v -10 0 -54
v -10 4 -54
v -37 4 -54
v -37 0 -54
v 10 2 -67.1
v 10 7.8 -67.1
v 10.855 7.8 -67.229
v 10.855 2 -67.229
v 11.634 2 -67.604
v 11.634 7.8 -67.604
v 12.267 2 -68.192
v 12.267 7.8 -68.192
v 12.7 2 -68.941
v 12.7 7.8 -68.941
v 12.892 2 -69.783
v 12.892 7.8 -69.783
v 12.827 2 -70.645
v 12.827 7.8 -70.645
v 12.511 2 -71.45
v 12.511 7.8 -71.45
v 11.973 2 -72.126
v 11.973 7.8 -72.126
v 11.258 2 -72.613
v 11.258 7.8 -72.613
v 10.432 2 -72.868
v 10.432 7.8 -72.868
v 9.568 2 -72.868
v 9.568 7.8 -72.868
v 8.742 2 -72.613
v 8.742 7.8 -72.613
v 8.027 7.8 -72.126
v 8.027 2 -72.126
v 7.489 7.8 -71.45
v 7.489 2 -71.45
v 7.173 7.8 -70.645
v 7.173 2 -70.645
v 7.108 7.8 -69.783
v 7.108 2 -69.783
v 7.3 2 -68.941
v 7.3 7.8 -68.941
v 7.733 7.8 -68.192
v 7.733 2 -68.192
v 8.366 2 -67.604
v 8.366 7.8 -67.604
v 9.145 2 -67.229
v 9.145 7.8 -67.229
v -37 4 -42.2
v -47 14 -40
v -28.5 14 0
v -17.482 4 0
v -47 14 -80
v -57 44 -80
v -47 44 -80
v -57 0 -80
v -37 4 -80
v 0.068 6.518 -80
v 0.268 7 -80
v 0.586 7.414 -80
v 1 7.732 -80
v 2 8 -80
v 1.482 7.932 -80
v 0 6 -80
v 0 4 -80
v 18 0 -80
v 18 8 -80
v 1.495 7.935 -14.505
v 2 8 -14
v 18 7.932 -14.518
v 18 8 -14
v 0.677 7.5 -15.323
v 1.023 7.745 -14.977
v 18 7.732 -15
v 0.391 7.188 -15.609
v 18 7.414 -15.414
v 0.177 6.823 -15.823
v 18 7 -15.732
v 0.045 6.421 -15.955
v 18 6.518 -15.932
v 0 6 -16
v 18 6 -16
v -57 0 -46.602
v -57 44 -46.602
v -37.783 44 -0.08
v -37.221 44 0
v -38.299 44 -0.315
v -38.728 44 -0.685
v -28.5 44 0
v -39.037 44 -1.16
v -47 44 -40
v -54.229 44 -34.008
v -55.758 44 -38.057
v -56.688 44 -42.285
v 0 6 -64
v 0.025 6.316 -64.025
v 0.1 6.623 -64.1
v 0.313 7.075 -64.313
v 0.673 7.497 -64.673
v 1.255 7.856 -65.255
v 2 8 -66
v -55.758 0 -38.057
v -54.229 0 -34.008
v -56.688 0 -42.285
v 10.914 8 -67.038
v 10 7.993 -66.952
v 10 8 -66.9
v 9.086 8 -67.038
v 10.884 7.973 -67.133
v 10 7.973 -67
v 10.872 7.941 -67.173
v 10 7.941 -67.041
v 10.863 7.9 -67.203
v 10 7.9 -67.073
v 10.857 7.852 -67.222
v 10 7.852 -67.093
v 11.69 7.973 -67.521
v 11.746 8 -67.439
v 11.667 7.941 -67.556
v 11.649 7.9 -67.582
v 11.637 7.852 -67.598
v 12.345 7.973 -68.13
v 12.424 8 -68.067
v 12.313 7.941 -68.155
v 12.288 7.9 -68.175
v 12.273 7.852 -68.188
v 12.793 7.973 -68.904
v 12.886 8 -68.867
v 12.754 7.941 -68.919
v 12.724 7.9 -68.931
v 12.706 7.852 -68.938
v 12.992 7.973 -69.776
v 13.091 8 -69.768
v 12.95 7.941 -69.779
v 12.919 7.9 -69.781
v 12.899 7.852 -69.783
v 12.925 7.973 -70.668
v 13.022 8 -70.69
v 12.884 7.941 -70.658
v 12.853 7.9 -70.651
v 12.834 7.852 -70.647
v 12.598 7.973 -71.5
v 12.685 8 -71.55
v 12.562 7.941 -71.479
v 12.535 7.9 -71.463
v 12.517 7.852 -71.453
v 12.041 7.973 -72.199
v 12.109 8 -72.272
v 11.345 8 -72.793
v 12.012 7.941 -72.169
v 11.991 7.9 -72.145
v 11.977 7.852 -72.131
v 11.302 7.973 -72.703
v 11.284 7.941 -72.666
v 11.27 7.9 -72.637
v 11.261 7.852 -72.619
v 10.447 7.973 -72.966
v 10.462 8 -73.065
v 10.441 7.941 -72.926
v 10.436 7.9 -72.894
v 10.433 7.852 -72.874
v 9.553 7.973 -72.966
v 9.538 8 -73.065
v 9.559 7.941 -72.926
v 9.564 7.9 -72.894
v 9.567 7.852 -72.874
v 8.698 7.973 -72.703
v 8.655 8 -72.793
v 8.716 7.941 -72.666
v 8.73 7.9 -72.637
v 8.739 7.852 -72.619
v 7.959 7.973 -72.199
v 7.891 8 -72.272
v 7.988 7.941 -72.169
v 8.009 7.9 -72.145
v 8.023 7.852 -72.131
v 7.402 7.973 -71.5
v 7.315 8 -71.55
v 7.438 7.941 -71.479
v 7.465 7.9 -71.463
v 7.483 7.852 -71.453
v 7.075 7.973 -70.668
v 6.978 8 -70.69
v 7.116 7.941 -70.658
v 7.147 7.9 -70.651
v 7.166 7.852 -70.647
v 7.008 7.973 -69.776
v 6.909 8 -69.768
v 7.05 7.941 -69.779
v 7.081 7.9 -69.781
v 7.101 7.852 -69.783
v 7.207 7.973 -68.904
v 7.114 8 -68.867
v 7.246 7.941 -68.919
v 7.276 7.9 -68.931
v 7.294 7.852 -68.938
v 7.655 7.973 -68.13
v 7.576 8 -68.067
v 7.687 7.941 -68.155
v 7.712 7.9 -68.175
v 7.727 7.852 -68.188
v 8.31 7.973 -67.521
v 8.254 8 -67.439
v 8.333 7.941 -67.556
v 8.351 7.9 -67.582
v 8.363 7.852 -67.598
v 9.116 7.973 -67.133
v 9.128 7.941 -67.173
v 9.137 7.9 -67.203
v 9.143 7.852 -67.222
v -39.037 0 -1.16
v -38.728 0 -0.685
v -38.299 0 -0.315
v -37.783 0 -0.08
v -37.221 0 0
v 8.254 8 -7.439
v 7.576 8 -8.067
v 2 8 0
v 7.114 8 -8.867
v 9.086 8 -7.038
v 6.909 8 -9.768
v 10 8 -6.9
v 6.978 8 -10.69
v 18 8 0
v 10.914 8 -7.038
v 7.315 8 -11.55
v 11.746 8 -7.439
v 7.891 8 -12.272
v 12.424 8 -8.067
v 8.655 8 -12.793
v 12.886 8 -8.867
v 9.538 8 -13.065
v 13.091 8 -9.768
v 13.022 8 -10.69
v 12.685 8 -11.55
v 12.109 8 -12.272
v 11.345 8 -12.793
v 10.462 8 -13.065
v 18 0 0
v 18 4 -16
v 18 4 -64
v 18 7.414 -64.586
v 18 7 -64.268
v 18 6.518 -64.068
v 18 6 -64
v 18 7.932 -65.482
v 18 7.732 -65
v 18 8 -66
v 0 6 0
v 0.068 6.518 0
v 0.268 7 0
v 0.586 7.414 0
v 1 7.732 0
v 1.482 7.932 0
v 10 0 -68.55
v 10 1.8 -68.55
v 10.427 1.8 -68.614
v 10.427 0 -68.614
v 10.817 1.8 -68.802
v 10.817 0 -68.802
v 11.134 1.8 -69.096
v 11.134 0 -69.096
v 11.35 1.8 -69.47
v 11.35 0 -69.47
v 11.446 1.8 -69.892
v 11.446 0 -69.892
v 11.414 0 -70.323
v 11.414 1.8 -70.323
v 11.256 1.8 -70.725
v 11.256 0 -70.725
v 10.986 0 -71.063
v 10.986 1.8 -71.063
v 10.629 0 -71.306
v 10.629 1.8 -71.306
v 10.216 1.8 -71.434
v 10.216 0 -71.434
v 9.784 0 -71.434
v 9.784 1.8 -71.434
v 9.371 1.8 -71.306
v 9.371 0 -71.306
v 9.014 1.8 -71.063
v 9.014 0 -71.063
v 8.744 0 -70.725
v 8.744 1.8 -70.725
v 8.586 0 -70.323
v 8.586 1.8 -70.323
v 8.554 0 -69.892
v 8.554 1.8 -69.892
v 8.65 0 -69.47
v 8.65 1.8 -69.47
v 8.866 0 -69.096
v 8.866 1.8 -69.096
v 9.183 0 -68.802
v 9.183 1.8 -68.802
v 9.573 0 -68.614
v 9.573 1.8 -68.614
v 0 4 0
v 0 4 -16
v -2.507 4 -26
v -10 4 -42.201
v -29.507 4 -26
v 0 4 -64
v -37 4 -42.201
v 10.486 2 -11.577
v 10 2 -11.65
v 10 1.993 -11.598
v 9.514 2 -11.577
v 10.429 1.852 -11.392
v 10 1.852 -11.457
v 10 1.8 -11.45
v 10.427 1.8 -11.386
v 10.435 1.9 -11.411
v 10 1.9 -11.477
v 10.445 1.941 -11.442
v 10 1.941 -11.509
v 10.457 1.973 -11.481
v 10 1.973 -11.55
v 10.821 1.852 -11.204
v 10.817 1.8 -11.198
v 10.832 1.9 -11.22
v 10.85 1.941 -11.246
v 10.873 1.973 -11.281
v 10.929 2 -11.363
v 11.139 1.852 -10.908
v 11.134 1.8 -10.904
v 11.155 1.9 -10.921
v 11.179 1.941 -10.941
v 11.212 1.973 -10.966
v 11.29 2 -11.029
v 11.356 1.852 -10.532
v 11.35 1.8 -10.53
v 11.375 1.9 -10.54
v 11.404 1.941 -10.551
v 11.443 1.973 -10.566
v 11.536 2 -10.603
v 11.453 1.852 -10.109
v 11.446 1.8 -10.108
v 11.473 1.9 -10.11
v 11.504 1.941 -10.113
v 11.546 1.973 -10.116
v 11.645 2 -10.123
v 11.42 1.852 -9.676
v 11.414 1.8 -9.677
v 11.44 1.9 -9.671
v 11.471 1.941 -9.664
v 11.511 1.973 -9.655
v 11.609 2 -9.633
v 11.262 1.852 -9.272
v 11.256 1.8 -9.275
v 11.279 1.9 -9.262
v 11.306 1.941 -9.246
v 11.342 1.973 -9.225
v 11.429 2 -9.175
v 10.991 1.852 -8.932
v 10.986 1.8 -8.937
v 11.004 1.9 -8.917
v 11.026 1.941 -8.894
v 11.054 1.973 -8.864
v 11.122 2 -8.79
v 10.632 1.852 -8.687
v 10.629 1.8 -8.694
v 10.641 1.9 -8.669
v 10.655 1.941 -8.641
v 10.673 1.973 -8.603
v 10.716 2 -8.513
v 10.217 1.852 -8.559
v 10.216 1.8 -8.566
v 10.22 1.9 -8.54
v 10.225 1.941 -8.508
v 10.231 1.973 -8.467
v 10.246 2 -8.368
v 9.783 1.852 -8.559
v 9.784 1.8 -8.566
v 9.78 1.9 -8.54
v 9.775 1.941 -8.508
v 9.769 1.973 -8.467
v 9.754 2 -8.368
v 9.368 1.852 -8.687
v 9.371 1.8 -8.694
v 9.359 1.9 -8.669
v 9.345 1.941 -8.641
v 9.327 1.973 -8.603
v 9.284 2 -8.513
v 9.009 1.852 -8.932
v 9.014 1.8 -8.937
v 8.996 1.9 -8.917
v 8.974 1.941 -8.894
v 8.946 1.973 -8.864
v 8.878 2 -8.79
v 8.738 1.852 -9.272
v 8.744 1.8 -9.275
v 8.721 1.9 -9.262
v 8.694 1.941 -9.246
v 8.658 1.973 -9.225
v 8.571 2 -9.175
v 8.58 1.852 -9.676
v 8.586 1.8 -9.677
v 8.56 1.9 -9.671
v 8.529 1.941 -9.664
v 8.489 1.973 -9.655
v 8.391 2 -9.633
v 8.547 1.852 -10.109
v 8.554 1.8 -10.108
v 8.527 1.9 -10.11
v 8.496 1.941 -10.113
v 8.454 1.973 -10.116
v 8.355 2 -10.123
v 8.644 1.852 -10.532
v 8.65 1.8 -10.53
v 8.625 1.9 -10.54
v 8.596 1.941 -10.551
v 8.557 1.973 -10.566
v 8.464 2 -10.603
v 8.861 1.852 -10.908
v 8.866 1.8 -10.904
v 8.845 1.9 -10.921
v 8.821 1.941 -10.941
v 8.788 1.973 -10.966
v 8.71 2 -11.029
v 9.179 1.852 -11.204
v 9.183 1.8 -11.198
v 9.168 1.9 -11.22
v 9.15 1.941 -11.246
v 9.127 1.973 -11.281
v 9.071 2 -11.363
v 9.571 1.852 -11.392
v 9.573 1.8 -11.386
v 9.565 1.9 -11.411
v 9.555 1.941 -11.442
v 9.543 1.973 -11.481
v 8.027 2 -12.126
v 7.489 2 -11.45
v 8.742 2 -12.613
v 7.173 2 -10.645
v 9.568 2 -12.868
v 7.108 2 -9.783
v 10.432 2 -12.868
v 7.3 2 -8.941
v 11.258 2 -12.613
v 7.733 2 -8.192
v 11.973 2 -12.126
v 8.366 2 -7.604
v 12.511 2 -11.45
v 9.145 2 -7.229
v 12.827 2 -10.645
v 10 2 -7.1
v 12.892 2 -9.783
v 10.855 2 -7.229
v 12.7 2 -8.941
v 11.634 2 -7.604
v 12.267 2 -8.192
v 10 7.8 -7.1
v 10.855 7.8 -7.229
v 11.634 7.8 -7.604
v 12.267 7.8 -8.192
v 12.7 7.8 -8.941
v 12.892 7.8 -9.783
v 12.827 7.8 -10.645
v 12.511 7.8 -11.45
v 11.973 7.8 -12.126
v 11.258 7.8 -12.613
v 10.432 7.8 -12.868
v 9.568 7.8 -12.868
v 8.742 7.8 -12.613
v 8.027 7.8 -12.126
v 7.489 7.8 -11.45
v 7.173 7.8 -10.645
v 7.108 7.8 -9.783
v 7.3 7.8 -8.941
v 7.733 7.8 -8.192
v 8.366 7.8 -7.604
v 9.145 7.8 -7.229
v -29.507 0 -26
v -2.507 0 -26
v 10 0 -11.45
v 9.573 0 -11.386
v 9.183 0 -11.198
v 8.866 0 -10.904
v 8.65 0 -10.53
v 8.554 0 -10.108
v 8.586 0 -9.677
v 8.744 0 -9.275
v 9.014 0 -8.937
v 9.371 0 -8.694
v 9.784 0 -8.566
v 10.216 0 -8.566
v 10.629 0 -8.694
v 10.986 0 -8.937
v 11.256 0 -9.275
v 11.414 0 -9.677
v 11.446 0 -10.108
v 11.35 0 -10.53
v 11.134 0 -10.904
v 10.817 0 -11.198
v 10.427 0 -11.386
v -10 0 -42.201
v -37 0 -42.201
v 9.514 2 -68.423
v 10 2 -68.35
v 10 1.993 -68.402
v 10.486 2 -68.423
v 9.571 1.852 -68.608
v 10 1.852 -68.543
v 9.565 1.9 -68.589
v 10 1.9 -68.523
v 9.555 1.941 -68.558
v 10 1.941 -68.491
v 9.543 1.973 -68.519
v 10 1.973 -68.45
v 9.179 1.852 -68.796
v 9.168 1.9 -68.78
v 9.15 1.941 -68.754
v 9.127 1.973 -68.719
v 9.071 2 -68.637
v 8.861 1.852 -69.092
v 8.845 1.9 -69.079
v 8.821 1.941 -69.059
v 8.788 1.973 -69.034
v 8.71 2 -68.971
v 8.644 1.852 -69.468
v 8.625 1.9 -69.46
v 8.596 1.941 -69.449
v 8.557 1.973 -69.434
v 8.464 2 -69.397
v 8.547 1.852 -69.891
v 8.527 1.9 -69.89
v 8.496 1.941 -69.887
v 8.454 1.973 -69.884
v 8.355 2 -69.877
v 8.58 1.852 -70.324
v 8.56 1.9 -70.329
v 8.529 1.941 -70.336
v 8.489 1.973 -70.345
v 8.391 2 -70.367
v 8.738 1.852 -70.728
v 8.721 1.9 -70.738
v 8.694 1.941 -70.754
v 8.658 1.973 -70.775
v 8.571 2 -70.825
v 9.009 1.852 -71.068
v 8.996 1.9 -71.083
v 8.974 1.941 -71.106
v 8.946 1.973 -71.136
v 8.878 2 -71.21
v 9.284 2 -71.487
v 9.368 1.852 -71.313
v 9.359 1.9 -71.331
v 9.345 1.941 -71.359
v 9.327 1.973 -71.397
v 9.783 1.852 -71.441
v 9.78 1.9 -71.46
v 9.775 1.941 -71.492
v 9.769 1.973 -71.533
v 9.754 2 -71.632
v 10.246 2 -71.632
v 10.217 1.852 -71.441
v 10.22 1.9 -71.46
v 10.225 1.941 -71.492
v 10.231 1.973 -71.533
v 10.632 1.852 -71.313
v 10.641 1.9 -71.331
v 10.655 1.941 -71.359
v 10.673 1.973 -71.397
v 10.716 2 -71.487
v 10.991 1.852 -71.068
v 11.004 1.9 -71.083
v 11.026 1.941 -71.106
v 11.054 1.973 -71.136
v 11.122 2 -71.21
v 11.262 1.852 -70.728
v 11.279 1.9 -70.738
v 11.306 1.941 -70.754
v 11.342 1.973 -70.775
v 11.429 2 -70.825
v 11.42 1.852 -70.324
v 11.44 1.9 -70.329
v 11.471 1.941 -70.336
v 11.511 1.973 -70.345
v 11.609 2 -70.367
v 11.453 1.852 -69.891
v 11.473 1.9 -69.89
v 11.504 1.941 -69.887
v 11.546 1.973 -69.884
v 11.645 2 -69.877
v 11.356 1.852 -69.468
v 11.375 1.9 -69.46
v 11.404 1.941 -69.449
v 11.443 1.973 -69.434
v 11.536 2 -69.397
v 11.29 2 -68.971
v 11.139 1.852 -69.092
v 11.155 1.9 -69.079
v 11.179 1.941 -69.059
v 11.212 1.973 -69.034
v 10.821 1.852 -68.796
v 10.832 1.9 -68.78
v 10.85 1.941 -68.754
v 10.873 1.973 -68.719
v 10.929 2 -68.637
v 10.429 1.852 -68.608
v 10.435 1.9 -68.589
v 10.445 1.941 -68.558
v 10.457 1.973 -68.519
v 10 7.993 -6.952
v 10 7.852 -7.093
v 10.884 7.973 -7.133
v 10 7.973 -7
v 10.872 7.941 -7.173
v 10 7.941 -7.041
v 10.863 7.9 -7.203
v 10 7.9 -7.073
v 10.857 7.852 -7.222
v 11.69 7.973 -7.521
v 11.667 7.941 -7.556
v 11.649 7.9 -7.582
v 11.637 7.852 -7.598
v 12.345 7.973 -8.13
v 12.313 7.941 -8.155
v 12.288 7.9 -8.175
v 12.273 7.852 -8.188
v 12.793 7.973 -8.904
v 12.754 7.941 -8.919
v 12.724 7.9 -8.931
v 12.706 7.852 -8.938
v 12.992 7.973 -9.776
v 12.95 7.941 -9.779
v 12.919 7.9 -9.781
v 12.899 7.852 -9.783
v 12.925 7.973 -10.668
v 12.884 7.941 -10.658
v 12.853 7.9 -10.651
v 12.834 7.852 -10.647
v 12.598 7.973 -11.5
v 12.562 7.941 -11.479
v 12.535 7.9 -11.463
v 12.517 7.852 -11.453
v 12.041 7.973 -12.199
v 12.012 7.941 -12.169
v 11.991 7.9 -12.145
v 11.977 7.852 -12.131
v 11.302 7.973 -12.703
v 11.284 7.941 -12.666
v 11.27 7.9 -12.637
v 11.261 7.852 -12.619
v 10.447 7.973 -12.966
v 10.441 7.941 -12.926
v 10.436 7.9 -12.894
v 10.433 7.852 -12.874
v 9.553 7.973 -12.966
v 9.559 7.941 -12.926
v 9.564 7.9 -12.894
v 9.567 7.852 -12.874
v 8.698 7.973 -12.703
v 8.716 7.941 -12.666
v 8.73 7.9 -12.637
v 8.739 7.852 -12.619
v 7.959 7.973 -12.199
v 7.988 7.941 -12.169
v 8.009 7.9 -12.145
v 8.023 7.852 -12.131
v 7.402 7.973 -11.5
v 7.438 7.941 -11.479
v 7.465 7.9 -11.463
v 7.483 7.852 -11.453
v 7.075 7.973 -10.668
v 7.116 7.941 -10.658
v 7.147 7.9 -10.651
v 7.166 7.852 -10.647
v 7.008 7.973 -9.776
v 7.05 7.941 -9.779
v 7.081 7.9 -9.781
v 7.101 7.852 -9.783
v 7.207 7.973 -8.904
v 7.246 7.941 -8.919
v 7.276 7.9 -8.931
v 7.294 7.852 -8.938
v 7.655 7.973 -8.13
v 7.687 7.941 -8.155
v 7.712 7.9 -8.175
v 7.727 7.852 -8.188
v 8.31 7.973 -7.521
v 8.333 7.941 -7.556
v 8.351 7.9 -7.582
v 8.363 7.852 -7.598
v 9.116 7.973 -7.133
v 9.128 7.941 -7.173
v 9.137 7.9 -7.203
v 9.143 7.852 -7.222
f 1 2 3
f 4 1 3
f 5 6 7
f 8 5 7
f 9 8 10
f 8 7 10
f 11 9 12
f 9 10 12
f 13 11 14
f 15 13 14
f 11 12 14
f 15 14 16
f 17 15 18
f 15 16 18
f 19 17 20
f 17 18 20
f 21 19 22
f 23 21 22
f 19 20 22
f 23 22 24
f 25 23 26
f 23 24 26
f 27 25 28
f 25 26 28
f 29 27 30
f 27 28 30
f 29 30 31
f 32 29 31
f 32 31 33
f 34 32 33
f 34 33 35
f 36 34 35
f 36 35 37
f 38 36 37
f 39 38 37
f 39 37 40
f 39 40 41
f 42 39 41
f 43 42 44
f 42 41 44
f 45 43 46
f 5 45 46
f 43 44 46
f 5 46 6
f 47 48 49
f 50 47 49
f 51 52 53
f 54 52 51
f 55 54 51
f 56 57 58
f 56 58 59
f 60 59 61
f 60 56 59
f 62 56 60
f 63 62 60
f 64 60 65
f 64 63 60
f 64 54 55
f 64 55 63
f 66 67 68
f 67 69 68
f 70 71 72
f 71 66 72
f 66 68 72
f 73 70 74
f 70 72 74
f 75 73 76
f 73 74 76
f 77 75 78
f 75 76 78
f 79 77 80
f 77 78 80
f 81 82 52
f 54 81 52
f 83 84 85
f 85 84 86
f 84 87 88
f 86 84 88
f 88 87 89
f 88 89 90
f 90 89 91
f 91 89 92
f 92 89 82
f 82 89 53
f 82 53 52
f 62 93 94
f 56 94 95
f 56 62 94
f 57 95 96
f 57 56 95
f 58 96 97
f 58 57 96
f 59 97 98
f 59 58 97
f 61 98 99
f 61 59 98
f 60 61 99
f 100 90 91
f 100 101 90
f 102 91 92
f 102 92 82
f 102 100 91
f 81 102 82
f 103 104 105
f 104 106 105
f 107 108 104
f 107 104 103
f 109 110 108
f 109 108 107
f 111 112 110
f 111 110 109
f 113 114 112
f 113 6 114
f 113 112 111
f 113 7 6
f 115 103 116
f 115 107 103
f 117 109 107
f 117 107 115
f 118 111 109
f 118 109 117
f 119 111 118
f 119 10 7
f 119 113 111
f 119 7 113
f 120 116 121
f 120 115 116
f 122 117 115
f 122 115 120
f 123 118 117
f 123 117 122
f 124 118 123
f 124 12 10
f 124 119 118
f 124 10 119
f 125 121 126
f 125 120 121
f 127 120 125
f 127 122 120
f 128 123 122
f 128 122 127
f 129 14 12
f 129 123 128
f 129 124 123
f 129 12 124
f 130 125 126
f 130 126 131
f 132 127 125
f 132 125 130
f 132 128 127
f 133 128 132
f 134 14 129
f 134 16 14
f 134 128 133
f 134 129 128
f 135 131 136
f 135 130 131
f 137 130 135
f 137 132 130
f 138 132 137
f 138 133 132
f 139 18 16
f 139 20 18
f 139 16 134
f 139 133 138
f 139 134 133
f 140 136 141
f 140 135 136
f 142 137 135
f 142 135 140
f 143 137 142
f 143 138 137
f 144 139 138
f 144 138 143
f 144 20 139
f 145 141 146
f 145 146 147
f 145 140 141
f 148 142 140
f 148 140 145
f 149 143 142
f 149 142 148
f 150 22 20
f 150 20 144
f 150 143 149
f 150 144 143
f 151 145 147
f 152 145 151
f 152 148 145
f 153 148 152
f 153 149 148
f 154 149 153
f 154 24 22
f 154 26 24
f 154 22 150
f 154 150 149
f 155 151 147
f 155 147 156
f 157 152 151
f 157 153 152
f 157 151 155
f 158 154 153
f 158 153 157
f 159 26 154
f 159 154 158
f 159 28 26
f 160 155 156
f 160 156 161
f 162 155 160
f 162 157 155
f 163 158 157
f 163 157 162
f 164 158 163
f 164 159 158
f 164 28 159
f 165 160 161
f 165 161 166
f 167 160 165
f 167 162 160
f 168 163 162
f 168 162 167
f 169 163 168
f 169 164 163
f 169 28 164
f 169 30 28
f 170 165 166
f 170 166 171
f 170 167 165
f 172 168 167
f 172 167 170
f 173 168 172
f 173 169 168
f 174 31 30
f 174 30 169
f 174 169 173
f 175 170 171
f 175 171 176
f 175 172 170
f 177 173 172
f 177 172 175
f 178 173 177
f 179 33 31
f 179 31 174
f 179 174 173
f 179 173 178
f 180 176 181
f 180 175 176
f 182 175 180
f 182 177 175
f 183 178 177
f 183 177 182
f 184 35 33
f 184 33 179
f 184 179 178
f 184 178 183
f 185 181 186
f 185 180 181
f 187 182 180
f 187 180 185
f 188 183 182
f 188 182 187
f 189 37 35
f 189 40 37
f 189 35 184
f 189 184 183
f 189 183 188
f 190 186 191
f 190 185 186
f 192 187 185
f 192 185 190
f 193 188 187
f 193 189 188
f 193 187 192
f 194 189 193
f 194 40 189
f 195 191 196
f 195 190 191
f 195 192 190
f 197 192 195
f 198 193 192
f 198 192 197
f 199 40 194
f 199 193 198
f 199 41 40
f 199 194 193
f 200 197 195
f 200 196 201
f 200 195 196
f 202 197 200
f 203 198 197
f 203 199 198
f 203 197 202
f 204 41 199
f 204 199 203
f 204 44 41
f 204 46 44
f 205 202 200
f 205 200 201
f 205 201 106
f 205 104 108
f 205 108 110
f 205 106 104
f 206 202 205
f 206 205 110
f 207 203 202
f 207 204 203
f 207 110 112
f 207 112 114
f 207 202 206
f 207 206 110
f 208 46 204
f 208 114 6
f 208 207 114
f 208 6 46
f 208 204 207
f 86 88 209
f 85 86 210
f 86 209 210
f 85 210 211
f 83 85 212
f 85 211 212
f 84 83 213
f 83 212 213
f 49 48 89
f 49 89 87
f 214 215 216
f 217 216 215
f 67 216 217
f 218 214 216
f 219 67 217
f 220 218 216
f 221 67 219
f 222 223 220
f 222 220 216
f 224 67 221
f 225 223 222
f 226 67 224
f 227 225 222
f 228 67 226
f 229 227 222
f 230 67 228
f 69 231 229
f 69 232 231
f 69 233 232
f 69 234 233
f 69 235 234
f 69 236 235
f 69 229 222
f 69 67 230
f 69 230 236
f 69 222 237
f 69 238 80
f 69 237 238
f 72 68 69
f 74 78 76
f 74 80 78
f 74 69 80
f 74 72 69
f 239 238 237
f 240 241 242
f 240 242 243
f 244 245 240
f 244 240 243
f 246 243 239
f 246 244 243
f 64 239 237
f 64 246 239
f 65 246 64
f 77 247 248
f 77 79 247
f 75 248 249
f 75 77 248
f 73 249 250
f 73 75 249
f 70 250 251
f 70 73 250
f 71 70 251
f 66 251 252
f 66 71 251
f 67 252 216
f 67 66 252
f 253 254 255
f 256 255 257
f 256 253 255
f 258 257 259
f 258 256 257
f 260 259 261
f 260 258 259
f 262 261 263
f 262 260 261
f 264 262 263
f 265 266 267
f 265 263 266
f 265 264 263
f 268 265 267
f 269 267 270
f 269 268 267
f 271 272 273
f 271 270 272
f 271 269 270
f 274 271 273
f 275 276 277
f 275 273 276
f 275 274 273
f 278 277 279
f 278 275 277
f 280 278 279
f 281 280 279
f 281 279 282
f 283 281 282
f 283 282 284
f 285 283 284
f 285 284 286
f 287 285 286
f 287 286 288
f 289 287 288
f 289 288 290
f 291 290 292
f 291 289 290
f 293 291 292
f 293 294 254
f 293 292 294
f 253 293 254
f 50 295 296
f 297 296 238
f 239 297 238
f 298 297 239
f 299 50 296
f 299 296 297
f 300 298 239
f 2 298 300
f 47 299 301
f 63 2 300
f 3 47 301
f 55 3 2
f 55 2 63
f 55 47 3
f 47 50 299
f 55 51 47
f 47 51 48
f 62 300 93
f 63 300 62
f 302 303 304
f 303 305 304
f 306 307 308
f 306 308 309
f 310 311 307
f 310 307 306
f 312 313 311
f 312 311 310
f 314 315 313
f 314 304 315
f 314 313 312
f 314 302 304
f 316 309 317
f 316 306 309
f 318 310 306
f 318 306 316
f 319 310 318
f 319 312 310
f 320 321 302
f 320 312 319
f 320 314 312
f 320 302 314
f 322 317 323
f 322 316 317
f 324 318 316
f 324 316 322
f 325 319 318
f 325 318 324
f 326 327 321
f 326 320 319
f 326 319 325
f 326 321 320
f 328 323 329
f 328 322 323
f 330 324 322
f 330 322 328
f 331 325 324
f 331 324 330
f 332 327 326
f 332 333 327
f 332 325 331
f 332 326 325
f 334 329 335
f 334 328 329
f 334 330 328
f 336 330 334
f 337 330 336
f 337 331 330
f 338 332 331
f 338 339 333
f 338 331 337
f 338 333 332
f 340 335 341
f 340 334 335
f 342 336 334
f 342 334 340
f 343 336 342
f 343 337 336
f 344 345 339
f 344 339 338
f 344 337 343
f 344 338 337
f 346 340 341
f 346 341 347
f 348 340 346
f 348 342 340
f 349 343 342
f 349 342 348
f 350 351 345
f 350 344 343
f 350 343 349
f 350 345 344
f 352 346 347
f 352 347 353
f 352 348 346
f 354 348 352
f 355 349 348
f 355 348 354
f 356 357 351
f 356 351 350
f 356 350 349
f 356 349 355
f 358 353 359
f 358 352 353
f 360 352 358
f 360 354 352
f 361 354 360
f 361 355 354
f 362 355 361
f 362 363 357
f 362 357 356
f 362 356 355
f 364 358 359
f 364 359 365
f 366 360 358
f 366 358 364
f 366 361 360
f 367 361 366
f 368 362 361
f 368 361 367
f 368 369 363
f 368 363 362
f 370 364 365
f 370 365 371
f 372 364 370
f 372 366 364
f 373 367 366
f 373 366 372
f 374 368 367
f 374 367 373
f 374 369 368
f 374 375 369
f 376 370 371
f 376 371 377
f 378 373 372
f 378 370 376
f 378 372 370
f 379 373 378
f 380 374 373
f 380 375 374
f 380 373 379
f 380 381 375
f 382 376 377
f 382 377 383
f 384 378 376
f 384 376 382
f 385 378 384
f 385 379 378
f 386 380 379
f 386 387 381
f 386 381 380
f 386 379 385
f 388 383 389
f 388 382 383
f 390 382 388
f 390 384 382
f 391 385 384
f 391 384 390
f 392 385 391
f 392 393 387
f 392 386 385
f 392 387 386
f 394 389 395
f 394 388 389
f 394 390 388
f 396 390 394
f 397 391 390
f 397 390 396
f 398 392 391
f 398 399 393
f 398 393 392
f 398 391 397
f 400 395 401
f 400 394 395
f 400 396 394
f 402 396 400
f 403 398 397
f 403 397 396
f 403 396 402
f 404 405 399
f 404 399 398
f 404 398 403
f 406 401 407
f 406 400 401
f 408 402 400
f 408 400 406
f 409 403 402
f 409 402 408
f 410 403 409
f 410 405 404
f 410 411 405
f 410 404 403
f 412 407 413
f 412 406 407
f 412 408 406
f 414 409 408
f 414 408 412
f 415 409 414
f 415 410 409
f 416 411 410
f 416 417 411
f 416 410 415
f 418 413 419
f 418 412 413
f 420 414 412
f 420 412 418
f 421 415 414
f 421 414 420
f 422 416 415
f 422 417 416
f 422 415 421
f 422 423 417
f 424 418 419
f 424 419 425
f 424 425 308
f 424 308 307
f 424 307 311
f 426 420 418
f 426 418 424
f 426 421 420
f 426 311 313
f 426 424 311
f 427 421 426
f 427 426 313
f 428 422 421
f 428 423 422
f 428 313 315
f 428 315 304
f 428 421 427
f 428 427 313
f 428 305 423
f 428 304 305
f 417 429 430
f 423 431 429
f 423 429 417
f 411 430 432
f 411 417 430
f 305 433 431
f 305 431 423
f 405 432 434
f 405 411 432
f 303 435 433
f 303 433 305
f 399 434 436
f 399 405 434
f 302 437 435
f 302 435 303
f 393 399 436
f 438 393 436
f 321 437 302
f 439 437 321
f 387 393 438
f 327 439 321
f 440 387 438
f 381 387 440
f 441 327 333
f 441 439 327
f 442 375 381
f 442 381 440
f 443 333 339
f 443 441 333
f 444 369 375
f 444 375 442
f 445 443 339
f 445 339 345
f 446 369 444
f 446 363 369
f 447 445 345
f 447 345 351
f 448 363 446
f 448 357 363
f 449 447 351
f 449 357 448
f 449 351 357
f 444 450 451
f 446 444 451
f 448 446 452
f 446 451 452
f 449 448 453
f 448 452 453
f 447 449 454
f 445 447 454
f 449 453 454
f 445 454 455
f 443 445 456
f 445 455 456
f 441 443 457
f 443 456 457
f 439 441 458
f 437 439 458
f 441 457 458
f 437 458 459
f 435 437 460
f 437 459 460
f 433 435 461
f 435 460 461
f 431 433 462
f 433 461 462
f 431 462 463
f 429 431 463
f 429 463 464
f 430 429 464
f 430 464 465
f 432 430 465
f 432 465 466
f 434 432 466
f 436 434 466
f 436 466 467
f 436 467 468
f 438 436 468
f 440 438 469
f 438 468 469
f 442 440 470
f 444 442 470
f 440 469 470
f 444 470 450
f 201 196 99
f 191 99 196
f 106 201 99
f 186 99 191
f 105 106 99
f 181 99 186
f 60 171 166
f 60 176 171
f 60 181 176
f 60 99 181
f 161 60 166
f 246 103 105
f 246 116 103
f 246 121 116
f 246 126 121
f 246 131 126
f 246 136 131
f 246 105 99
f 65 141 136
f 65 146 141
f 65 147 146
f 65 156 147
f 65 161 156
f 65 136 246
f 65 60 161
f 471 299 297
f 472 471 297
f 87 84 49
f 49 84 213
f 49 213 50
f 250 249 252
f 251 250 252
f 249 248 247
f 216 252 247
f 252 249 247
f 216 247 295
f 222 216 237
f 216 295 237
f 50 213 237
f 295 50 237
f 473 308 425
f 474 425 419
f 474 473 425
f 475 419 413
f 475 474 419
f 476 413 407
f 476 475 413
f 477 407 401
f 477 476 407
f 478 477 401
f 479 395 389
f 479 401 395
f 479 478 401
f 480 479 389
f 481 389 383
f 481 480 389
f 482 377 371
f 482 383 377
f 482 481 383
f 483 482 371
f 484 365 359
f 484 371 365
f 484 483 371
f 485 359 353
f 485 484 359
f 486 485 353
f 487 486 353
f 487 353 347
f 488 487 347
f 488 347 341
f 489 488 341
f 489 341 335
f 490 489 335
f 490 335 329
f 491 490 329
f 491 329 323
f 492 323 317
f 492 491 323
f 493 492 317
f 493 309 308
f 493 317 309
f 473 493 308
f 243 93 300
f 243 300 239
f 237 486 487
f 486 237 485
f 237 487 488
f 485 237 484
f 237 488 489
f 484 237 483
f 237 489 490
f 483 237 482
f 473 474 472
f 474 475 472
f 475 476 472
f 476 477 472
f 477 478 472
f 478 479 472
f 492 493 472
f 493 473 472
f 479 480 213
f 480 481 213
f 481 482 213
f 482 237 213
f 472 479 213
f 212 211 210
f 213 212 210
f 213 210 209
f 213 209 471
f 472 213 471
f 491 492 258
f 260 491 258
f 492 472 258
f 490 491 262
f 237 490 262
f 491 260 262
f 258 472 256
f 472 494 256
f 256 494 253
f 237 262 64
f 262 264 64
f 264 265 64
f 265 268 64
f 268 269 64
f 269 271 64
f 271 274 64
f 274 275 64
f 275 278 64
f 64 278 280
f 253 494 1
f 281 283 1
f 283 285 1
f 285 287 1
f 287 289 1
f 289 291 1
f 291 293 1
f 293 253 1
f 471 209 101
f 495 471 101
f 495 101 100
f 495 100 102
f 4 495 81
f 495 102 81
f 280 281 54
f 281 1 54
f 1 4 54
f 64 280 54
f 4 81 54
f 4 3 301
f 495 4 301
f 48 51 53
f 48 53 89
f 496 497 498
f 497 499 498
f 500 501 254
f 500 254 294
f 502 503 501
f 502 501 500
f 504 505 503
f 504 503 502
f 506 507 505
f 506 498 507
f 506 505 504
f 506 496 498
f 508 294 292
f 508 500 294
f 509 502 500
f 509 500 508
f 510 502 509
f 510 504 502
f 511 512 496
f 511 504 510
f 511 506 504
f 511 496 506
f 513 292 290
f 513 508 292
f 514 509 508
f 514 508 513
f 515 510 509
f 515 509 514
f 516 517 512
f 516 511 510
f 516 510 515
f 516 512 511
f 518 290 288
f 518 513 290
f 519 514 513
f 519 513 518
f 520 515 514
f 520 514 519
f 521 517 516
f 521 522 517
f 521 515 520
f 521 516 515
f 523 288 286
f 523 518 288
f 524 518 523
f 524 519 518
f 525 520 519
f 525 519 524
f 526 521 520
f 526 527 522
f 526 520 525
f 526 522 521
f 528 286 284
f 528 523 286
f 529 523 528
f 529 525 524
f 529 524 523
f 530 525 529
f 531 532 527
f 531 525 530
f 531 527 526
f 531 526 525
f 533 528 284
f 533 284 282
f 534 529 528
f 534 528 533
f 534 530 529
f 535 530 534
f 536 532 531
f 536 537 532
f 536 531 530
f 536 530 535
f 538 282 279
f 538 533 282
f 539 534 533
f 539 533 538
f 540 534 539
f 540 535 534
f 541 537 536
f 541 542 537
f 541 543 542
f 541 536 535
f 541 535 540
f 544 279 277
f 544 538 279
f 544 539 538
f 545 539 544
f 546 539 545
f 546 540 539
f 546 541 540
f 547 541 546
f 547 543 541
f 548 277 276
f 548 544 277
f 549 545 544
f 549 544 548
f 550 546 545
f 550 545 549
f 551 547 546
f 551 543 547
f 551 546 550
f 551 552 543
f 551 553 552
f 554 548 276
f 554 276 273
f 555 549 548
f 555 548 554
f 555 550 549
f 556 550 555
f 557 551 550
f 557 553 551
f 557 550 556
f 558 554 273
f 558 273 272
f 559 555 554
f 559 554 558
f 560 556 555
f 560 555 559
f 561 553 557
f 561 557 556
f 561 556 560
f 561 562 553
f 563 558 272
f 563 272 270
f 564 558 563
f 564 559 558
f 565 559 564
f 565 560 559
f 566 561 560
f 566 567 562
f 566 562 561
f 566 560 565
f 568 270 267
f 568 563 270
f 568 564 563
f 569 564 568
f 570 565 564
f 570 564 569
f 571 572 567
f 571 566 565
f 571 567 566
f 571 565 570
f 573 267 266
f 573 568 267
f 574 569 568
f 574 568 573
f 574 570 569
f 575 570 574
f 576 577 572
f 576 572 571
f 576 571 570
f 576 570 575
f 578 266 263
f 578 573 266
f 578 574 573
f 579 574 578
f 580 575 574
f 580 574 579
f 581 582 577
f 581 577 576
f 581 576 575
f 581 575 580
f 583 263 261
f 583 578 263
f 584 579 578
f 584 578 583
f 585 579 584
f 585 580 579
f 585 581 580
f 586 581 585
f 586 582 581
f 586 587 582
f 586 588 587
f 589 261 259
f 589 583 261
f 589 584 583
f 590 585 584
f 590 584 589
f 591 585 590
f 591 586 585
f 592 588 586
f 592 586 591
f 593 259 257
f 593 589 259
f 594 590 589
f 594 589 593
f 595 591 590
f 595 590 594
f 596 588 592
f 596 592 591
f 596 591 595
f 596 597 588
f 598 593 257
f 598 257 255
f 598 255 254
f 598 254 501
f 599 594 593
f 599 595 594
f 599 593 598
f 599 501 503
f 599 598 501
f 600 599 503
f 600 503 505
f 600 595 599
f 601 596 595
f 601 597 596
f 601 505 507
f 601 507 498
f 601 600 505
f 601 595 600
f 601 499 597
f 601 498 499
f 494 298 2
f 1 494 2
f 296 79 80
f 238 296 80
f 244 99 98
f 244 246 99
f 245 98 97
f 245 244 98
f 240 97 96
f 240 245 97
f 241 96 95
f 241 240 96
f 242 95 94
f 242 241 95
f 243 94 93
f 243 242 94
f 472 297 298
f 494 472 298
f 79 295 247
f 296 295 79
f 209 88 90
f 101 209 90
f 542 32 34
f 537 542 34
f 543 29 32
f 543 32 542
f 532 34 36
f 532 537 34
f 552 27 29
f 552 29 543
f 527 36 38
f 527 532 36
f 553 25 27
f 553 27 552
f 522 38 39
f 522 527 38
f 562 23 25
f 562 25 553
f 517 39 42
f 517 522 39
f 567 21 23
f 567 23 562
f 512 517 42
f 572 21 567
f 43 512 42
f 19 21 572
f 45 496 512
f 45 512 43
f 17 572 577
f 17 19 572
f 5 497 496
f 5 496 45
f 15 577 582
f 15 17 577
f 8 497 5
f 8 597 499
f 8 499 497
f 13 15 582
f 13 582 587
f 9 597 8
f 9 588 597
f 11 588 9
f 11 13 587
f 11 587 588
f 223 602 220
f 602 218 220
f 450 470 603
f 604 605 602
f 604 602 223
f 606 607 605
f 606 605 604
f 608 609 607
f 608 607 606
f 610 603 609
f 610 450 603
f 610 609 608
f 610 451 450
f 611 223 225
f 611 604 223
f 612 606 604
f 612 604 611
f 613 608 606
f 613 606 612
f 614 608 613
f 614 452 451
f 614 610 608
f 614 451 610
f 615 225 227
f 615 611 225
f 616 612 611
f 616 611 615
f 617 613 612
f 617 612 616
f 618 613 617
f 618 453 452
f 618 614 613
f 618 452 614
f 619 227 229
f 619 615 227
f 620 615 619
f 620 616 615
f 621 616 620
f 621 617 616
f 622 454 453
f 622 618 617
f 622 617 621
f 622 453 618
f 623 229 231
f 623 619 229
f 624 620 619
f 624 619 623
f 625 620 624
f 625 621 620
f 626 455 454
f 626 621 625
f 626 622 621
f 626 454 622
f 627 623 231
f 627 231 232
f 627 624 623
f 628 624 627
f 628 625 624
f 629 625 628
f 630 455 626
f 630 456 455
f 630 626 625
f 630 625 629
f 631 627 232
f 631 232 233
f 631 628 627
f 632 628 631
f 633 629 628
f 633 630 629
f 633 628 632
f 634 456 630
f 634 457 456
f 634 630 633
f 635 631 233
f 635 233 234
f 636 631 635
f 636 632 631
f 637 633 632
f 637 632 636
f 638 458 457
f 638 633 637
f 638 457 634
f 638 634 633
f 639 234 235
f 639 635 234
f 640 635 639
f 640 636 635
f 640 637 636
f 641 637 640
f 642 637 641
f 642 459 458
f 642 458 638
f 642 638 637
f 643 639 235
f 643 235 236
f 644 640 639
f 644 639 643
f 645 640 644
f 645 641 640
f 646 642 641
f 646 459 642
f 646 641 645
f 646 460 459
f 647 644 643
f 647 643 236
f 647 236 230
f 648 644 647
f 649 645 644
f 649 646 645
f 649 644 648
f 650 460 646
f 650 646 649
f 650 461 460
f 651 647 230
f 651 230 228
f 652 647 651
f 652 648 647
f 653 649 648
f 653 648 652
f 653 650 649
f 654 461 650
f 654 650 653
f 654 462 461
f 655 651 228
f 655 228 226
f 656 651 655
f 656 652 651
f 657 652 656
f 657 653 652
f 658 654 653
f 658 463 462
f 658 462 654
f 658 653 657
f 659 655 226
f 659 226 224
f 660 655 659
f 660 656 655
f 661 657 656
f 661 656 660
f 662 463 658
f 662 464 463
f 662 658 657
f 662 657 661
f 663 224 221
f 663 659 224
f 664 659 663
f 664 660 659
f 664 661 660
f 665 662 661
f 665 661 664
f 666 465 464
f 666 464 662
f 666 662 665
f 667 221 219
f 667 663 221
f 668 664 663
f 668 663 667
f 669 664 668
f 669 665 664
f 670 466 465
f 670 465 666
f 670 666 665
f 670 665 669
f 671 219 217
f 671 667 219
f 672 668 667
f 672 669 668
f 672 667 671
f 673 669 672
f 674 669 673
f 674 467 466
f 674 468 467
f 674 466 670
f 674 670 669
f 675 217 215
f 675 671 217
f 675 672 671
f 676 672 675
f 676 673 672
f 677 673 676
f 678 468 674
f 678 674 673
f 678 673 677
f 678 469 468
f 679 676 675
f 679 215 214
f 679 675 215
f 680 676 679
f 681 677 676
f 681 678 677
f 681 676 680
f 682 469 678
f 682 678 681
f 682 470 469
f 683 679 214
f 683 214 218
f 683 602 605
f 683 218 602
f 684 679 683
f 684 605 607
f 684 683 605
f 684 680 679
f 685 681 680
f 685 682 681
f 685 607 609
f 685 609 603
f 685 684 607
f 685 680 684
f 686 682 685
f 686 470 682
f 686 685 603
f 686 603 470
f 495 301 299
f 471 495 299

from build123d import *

# Parameters (mm, degrees)
SKETCH_1_W               = 57
SKETCH_1_H               = 80
EXTRUDE_1_DEPTH          = 4
EXTRUDE_2_DEPTH          = 40
CUT_EXTRUDE_1_DEPTH      = 16
SKETCH_4_W               = 80
SKETCH_4_H               = 4
EXTRUDE_3_DEPTH          = 20
SKETCH_7_W               = 20
SKETCH_7_H               = 80
EXTRUDE_4_DEPTH          = 4
CUT_EXTRUDE_2_DEPTH      = 4
CUT_EXTRUDE_2_DEPTH_BACK = 4
SKETCH_5_R               = 1.45
SKETCH_8_R               = 2.9
CUT_EXTRUDE_3_DEPTH      = 6
SKETCH_9_W               = 80
SKETCH_9_H               = 8
CUT_EXTRUDE_4_DEPTH      = 2
SKETCH_10_W              = 18
SKETCH_10_H              = 48
CUT_EXTRUDE_5_DEPTH      = 4
CUT_EXTRUDE_6_DEPTH      = 4
CHAMFER_1_SIZE           = 10
FILLET_1_R               = 30
FILLET_2_R               = 2
FILLET_3_R               = 0.2


with BuildPart() as part:
    # 草图1 → 凸台-拉伸1 (new body)
    with BuildSketch(Plane(origin=(0, 0, 0), x_dir=(1, 0, 0), z_dir=(0, 1, 0))):
        with Locations((-28.5, 40)):
            Rectangle(SKETCH_1_W, SKETCH_1_H)
    extrude(amount=EXTRUDE_1_DEPTH)

    # 草图2 → 凸台-拉伸2 (add)
    with BuildSketch(Plane(origin=(0, 4, 0), x_dir=(1, 0, 0), z_dir=(0, 1, 0))):
        Polygon((-47, 40), (-28.5, 0), (-38.5, 0), (-57, 40), (-57, 80), (-47, 80), align=None)
    extrude(amount=EXTRUDE_2_DEPTH)

    # 草图3 → 切除-拉伸1 (cut)
    with BuildSketch(Plane(origin=(0, 4, 0), x_dir=(1, 0, 0), z_dir=(0, 1, 0))):
        Polygon((-38.5, 0), (-57, 40), (-57, 0), align=None)
    extrude(amount=-CUT_EXTRUDE_1_DEPTH, mode=Mode.SUBTRACT)

    # 草图4 → 凸台-拉伸3 (add)
    with BuildSketch(Plane(origin=(0, 0, 0), x_dir=(0, 0, -1), z_dir=(1, 0, 0))):
        with Locations((40, 2)):
            Rectangle(SKETCH_4_W, SKETCH_4_H)
    extrude(amount=EXTRUDE_3_DEPTH)

    # 草图7 → 凸台-拉伸4 (add)
    with BuildSketch(Plane(origin=(0, 4, 0), x_dir=(1, 0, 0), z_dir=(0, 1, 0))):
        with Locations((10, 40)):
            Rectangle(SKETCH_7_W, SKETCH_7_H)
    extrude(amount=EXTRUDE_4_DEPTH)

    # 草图5 → 切除-拉伸2 (cut, two sides: drawn at the far end of the back side and taken through both)
    with BuildSketch(Plane(origin=(0, 4, 0), x_dir=(1, 0, 0), z_dir=(0, 1, 0)).offset(-CUT_EXTRUDE_2_DEPTH_BACK)):
        with Locations(Location((10, 70, 0), (0, 0, 270))):
            Circle(SKETCH_5_R)
        with Locations(Location((10, 10, 0), (0, 0, 90))):
            Circle(SKETCH_5_R)
    extrude(amount=CUT_EXTRUDE_2_DEPTH + CUT_EXTRUDE_2_DEPTH_BACK, mode=Mode.SUBTRACT)

    # 草图8 → 切除-拉伸3 (cut)
    with BuildSketch(Plane(origin=(0, 8, 0), x_dir=(1, 0, 0), z_dir=(0, 1, 0))):
        with Locations(Location((10, 70, 0), (0, 0, 270))):
            Circle(SKETCH_8_R)
        with Locations(Location((10, 10, 0), (0, 0, 270))):
            Circle(SKETCH_8_R)
    extrude(amount=-CUT_EXTRUDE_3_DEPTH, mode=Mode.SUBTRACT)

    # 草图9 → 切除-拉伸4 (cut)
    with BuildSketch(Plane(origin=(20, 0, 0), x_dir=(0, 0, -1), z_dir=(1, 0, 0))):
        with Locations((40, 4)):
            Rectangle(SKETCH_9_W, SKETCH_9_H)
    extrude(amount=-CUT_EXTRUDE_4_DEPTH, mode=Mode.SUBTRACT)

    # 草图10 → 切除-拉伸5 (cut)
    with BuildSketch(Plane(origin=(0, 8, 0), x_dir=(1, 0, 0), z_dir=(0, 1, 0))):
        with Locations((9, 40)):
            Rectangle(SKETCH_10_W, SKETCH_10_H)
    extrude(amount=-CUT_EXTRUDE_5_DEPTH, mode=Mode.SUBTRACT)

    # 草图11 → 切除-拉伸6 (cut)
    with BuildSketch(Plane(origin=(0, 4, 0), x_dir=(1, 0, 0), z_dir=(0, 1, 0))):
        Polygon((-37, 42.200521891), (-29.507258625, 26), (-2.507258625, 26), (-10, 42.200521891), (-10, 54), (-37, 54), align=None)
    extrude(amount=-CUT_EXTRUDE_6_DEPTH, mode=Mode.SUBTRACT)

    # 倒角1
    chamfer_1_edges = [part.edges().sort_by_distance(p)[0] for p in [
        (-37.75, 4, -20),
        (-47, 4, -60),
    ]]
    chamfer(chamfer_1_edges, length=CHAMFER_1_SIZE - 0.0001)  # a hair under: the kernel refuses the full size

    # 圆角1
    fillet_1_edges = [part.edges().sort_by_distance(p)[0] for p in [
        (-57, 22, -40),
    ]]
    fillet(fillet_1_edges, radius=FILLET_1_R)

    # 圆角2
    fillet_2_edges = [part.edges().sort_by_distance(p)[0] for p in [
        (0, 8, -8),
        (9, 8, -16),
        (9, 8, -64),
        (-38.5, 22, 0),
        (0, 8, -72),
    ]]
    fillet(fillet_2_edges, radius=FILLET_2_R)

    # 圆角3
    fillet_3_edges = [part.edges().sort_by_distance(p)[0] for p in [
        (10, 2, -71.45),
        (10, 8, -72.9),
        (10, 2, -8.55),
        (10, 8, -12.9),
    ]]
    fillet(fillet_3_edges, radius=FILLET_3_R)


solid = part.part
